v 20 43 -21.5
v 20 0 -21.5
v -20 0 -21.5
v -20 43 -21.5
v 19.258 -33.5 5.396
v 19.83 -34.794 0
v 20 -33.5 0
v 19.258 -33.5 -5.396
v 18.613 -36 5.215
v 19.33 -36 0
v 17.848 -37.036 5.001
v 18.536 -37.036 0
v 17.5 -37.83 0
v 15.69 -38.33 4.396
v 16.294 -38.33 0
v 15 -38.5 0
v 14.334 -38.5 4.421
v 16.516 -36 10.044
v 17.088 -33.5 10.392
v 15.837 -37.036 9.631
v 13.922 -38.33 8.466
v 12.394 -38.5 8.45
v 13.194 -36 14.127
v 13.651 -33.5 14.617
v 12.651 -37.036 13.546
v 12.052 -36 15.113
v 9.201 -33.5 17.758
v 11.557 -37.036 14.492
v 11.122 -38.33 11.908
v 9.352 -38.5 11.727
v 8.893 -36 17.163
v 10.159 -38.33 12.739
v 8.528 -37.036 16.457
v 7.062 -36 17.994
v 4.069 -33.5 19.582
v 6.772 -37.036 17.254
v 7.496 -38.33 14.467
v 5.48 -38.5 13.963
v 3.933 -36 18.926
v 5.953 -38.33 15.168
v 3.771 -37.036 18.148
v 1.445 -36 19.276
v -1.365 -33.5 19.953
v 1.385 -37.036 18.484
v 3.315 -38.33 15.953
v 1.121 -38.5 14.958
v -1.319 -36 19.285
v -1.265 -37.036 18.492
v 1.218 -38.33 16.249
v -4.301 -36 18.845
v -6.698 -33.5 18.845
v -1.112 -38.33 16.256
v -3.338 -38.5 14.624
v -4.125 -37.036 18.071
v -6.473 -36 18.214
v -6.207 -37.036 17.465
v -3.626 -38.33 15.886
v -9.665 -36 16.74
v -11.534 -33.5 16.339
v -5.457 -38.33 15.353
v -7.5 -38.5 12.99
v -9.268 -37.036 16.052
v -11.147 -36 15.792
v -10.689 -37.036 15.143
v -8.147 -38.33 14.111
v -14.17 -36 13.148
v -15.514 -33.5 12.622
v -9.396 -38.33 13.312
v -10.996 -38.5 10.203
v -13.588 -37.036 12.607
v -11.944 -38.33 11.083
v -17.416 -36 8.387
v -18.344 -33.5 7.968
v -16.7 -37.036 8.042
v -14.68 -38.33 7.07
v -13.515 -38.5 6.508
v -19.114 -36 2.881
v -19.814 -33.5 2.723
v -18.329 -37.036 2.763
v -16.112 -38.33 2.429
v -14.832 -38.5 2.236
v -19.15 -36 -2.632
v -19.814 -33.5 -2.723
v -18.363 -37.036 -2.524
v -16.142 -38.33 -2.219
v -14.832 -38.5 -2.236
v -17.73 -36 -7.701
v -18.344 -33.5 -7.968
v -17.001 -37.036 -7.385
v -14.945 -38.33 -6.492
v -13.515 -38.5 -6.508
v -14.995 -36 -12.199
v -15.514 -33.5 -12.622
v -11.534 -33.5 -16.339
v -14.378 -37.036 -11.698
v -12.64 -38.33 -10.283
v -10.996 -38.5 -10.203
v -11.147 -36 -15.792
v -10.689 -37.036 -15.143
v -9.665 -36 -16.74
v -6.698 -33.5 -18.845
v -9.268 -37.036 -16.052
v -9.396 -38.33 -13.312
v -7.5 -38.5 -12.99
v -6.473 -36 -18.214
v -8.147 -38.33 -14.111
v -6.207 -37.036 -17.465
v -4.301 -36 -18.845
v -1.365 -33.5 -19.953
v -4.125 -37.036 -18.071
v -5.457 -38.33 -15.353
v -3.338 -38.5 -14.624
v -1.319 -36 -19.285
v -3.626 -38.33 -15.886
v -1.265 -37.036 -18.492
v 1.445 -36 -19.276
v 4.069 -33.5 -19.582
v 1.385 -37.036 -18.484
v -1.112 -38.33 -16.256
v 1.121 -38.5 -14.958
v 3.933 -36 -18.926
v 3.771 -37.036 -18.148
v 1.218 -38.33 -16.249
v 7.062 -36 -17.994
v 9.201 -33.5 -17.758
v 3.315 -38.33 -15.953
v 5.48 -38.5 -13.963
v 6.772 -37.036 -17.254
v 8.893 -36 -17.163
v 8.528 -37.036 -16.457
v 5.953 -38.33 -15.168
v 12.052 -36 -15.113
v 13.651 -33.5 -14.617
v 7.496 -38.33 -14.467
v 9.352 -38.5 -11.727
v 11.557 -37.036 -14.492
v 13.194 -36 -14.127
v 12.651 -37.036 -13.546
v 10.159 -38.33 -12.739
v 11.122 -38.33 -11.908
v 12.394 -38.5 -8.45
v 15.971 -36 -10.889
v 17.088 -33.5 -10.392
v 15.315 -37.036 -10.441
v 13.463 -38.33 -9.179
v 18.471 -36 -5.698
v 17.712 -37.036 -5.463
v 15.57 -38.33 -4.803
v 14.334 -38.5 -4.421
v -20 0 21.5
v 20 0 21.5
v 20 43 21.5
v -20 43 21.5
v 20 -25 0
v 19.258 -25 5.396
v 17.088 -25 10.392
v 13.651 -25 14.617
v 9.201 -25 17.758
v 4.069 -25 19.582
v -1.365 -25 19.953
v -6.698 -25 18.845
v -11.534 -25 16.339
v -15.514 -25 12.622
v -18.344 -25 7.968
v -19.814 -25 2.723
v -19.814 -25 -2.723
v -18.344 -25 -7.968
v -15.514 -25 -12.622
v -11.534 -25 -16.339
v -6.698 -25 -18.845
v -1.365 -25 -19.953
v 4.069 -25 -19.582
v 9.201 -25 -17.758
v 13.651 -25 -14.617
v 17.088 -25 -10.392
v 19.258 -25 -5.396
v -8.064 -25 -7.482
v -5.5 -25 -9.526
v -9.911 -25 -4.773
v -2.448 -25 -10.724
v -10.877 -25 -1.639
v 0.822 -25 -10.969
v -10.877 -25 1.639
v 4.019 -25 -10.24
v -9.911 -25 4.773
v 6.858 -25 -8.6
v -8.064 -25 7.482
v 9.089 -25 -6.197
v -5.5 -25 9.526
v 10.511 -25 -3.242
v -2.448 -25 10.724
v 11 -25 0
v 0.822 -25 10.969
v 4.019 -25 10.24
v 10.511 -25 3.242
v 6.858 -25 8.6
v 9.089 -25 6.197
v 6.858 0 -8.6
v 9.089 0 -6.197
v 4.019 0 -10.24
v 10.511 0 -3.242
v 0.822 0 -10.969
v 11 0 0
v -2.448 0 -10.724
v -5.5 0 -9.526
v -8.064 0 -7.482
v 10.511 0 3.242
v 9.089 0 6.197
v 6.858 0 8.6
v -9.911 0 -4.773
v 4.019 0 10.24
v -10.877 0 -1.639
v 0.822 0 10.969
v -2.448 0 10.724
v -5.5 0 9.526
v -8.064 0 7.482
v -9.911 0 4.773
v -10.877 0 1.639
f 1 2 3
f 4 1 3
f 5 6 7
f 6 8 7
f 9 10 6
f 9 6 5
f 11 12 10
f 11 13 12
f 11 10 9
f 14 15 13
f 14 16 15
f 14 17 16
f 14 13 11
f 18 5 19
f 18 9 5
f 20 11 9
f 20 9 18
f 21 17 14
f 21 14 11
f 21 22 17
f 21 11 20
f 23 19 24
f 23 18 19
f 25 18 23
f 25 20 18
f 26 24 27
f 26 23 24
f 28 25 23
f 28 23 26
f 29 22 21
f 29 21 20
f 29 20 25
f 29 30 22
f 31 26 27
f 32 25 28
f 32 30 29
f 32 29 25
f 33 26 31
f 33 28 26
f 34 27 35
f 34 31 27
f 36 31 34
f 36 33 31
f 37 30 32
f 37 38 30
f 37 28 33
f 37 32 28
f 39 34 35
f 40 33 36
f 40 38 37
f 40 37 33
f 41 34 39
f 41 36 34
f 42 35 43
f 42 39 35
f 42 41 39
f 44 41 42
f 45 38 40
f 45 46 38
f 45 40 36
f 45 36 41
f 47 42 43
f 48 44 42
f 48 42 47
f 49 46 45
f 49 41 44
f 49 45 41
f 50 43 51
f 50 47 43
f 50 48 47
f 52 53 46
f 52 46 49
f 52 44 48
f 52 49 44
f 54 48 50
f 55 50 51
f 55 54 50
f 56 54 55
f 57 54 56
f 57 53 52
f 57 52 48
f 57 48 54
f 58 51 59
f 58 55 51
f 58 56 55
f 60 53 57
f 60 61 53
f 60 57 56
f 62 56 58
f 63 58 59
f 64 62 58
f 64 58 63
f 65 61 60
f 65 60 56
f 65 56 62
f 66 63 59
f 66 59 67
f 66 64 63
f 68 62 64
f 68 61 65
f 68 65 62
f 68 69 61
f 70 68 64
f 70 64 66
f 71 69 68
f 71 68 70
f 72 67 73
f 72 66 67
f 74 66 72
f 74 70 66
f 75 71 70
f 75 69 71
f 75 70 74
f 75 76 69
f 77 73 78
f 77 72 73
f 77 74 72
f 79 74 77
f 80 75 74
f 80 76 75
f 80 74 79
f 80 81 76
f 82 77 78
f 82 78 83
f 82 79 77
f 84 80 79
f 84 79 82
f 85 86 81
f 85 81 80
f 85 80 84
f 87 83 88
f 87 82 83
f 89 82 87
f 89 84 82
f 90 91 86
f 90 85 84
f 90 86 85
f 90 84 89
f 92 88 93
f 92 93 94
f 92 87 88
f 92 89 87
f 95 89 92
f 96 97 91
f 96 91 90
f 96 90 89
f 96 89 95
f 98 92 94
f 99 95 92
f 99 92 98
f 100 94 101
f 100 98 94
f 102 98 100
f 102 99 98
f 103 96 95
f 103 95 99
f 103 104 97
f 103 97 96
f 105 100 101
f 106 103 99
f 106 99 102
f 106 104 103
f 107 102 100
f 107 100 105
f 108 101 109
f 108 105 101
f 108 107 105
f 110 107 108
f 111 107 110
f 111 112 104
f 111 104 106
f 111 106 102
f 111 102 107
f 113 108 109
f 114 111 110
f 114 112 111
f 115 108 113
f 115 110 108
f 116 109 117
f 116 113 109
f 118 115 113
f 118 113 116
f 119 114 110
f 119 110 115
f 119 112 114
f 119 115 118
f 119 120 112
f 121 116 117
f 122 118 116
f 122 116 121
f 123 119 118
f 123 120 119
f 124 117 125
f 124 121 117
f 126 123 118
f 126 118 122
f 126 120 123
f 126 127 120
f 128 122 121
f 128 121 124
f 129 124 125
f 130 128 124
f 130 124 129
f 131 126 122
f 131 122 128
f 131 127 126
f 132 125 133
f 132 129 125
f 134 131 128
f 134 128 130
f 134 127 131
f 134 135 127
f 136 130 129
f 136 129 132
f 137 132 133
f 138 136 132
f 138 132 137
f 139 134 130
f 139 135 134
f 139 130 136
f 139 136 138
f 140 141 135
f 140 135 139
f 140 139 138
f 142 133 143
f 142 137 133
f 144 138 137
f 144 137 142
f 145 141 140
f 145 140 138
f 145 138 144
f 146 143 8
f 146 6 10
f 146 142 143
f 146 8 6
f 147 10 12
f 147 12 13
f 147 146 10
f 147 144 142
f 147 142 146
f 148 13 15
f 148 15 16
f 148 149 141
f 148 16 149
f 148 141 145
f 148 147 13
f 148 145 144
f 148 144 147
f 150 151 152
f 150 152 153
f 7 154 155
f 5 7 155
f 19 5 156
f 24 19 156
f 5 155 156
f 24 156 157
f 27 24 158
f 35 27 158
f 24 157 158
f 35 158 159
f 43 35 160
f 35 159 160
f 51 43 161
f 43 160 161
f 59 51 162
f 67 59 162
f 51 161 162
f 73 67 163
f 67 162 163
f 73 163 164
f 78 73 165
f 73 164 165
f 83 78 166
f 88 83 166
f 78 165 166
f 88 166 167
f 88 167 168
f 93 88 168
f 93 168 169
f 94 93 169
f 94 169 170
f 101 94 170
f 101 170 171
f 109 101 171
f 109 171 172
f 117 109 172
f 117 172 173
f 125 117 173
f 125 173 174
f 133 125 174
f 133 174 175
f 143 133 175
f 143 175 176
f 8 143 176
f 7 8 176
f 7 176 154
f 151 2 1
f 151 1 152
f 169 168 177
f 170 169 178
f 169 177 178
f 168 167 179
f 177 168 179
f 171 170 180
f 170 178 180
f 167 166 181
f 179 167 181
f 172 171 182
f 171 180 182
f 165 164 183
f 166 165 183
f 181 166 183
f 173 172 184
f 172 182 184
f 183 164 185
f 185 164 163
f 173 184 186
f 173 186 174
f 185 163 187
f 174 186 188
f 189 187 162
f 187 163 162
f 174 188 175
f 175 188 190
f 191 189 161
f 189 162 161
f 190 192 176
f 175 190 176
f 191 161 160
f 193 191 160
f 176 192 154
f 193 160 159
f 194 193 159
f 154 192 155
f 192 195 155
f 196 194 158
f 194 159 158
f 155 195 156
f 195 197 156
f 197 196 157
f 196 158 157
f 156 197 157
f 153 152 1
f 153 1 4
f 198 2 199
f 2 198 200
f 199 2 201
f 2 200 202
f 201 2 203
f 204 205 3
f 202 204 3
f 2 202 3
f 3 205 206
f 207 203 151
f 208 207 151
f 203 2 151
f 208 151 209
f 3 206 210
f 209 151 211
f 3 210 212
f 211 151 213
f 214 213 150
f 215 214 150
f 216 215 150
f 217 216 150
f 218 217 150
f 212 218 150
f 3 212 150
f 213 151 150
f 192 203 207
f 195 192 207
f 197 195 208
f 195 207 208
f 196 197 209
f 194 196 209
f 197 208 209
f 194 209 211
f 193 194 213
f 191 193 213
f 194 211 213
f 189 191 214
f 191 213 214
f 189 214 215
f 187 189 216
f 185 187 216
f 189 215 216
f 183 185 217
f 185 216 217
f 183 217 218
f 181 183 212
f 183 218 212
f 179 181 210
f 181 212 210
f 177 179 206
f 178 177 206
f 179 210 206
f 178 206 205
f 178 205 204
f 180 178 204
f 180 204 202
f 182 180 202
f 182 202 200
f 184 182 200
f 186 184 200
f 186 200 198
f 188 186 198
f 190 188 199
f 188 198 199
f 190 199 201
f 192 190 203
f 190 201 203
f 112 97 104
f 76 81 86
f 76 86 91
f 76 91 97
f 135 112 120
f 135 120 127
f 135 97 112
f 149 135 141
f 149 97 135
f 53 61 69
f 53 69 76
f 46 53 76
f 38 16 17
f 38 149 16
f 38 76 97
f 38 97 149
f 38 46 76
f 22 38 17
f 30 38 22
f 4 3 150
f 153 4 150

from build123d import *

# Parameters (mm, degrees)
F0_R     = 20
F1_DEPTH = 38.5
F2_W     = 40
F2_H     = 43
F3_DEPTH = 43
F4_R     = 20
F4_R_2   = 11
F5_DEPTH = 25
F6_R     = 5


with BuildPart() as f1:
    # F0 (on Front) → F1 (new body)
    with BuildSketch(Plane.XZ):
        Circle(F0_R)
    extrude(amount=F1_DEPTH)

    # F2 (on face) → F3 (join)
    with BuildSketch(Plane(origin=(0, 0, 0), x_dir=(-1, 0, 0), z_dir=(0, 1, 0))):
        Rectangle(F2_W, F2_H)
    extrude(amount=F3_DEPTH)

    # F4 (on face) → F5 (cut)
    with BuildSketch(Plane.XZ):
        Circle(F4_R)
        Circle(F4_R_2, mode=Mode.SUBTRACT)
    extrude(amount=F5_DEPTH, mode=Mode.SUBTRACT)

    # F6
    f6_edges = [f1.edges().sort_by_distance(p)[0] for p in [
        (-20, -38.5, 0),
    ]]
    fillet(f6_edges, radius=F6_R)


solid = f1.part
